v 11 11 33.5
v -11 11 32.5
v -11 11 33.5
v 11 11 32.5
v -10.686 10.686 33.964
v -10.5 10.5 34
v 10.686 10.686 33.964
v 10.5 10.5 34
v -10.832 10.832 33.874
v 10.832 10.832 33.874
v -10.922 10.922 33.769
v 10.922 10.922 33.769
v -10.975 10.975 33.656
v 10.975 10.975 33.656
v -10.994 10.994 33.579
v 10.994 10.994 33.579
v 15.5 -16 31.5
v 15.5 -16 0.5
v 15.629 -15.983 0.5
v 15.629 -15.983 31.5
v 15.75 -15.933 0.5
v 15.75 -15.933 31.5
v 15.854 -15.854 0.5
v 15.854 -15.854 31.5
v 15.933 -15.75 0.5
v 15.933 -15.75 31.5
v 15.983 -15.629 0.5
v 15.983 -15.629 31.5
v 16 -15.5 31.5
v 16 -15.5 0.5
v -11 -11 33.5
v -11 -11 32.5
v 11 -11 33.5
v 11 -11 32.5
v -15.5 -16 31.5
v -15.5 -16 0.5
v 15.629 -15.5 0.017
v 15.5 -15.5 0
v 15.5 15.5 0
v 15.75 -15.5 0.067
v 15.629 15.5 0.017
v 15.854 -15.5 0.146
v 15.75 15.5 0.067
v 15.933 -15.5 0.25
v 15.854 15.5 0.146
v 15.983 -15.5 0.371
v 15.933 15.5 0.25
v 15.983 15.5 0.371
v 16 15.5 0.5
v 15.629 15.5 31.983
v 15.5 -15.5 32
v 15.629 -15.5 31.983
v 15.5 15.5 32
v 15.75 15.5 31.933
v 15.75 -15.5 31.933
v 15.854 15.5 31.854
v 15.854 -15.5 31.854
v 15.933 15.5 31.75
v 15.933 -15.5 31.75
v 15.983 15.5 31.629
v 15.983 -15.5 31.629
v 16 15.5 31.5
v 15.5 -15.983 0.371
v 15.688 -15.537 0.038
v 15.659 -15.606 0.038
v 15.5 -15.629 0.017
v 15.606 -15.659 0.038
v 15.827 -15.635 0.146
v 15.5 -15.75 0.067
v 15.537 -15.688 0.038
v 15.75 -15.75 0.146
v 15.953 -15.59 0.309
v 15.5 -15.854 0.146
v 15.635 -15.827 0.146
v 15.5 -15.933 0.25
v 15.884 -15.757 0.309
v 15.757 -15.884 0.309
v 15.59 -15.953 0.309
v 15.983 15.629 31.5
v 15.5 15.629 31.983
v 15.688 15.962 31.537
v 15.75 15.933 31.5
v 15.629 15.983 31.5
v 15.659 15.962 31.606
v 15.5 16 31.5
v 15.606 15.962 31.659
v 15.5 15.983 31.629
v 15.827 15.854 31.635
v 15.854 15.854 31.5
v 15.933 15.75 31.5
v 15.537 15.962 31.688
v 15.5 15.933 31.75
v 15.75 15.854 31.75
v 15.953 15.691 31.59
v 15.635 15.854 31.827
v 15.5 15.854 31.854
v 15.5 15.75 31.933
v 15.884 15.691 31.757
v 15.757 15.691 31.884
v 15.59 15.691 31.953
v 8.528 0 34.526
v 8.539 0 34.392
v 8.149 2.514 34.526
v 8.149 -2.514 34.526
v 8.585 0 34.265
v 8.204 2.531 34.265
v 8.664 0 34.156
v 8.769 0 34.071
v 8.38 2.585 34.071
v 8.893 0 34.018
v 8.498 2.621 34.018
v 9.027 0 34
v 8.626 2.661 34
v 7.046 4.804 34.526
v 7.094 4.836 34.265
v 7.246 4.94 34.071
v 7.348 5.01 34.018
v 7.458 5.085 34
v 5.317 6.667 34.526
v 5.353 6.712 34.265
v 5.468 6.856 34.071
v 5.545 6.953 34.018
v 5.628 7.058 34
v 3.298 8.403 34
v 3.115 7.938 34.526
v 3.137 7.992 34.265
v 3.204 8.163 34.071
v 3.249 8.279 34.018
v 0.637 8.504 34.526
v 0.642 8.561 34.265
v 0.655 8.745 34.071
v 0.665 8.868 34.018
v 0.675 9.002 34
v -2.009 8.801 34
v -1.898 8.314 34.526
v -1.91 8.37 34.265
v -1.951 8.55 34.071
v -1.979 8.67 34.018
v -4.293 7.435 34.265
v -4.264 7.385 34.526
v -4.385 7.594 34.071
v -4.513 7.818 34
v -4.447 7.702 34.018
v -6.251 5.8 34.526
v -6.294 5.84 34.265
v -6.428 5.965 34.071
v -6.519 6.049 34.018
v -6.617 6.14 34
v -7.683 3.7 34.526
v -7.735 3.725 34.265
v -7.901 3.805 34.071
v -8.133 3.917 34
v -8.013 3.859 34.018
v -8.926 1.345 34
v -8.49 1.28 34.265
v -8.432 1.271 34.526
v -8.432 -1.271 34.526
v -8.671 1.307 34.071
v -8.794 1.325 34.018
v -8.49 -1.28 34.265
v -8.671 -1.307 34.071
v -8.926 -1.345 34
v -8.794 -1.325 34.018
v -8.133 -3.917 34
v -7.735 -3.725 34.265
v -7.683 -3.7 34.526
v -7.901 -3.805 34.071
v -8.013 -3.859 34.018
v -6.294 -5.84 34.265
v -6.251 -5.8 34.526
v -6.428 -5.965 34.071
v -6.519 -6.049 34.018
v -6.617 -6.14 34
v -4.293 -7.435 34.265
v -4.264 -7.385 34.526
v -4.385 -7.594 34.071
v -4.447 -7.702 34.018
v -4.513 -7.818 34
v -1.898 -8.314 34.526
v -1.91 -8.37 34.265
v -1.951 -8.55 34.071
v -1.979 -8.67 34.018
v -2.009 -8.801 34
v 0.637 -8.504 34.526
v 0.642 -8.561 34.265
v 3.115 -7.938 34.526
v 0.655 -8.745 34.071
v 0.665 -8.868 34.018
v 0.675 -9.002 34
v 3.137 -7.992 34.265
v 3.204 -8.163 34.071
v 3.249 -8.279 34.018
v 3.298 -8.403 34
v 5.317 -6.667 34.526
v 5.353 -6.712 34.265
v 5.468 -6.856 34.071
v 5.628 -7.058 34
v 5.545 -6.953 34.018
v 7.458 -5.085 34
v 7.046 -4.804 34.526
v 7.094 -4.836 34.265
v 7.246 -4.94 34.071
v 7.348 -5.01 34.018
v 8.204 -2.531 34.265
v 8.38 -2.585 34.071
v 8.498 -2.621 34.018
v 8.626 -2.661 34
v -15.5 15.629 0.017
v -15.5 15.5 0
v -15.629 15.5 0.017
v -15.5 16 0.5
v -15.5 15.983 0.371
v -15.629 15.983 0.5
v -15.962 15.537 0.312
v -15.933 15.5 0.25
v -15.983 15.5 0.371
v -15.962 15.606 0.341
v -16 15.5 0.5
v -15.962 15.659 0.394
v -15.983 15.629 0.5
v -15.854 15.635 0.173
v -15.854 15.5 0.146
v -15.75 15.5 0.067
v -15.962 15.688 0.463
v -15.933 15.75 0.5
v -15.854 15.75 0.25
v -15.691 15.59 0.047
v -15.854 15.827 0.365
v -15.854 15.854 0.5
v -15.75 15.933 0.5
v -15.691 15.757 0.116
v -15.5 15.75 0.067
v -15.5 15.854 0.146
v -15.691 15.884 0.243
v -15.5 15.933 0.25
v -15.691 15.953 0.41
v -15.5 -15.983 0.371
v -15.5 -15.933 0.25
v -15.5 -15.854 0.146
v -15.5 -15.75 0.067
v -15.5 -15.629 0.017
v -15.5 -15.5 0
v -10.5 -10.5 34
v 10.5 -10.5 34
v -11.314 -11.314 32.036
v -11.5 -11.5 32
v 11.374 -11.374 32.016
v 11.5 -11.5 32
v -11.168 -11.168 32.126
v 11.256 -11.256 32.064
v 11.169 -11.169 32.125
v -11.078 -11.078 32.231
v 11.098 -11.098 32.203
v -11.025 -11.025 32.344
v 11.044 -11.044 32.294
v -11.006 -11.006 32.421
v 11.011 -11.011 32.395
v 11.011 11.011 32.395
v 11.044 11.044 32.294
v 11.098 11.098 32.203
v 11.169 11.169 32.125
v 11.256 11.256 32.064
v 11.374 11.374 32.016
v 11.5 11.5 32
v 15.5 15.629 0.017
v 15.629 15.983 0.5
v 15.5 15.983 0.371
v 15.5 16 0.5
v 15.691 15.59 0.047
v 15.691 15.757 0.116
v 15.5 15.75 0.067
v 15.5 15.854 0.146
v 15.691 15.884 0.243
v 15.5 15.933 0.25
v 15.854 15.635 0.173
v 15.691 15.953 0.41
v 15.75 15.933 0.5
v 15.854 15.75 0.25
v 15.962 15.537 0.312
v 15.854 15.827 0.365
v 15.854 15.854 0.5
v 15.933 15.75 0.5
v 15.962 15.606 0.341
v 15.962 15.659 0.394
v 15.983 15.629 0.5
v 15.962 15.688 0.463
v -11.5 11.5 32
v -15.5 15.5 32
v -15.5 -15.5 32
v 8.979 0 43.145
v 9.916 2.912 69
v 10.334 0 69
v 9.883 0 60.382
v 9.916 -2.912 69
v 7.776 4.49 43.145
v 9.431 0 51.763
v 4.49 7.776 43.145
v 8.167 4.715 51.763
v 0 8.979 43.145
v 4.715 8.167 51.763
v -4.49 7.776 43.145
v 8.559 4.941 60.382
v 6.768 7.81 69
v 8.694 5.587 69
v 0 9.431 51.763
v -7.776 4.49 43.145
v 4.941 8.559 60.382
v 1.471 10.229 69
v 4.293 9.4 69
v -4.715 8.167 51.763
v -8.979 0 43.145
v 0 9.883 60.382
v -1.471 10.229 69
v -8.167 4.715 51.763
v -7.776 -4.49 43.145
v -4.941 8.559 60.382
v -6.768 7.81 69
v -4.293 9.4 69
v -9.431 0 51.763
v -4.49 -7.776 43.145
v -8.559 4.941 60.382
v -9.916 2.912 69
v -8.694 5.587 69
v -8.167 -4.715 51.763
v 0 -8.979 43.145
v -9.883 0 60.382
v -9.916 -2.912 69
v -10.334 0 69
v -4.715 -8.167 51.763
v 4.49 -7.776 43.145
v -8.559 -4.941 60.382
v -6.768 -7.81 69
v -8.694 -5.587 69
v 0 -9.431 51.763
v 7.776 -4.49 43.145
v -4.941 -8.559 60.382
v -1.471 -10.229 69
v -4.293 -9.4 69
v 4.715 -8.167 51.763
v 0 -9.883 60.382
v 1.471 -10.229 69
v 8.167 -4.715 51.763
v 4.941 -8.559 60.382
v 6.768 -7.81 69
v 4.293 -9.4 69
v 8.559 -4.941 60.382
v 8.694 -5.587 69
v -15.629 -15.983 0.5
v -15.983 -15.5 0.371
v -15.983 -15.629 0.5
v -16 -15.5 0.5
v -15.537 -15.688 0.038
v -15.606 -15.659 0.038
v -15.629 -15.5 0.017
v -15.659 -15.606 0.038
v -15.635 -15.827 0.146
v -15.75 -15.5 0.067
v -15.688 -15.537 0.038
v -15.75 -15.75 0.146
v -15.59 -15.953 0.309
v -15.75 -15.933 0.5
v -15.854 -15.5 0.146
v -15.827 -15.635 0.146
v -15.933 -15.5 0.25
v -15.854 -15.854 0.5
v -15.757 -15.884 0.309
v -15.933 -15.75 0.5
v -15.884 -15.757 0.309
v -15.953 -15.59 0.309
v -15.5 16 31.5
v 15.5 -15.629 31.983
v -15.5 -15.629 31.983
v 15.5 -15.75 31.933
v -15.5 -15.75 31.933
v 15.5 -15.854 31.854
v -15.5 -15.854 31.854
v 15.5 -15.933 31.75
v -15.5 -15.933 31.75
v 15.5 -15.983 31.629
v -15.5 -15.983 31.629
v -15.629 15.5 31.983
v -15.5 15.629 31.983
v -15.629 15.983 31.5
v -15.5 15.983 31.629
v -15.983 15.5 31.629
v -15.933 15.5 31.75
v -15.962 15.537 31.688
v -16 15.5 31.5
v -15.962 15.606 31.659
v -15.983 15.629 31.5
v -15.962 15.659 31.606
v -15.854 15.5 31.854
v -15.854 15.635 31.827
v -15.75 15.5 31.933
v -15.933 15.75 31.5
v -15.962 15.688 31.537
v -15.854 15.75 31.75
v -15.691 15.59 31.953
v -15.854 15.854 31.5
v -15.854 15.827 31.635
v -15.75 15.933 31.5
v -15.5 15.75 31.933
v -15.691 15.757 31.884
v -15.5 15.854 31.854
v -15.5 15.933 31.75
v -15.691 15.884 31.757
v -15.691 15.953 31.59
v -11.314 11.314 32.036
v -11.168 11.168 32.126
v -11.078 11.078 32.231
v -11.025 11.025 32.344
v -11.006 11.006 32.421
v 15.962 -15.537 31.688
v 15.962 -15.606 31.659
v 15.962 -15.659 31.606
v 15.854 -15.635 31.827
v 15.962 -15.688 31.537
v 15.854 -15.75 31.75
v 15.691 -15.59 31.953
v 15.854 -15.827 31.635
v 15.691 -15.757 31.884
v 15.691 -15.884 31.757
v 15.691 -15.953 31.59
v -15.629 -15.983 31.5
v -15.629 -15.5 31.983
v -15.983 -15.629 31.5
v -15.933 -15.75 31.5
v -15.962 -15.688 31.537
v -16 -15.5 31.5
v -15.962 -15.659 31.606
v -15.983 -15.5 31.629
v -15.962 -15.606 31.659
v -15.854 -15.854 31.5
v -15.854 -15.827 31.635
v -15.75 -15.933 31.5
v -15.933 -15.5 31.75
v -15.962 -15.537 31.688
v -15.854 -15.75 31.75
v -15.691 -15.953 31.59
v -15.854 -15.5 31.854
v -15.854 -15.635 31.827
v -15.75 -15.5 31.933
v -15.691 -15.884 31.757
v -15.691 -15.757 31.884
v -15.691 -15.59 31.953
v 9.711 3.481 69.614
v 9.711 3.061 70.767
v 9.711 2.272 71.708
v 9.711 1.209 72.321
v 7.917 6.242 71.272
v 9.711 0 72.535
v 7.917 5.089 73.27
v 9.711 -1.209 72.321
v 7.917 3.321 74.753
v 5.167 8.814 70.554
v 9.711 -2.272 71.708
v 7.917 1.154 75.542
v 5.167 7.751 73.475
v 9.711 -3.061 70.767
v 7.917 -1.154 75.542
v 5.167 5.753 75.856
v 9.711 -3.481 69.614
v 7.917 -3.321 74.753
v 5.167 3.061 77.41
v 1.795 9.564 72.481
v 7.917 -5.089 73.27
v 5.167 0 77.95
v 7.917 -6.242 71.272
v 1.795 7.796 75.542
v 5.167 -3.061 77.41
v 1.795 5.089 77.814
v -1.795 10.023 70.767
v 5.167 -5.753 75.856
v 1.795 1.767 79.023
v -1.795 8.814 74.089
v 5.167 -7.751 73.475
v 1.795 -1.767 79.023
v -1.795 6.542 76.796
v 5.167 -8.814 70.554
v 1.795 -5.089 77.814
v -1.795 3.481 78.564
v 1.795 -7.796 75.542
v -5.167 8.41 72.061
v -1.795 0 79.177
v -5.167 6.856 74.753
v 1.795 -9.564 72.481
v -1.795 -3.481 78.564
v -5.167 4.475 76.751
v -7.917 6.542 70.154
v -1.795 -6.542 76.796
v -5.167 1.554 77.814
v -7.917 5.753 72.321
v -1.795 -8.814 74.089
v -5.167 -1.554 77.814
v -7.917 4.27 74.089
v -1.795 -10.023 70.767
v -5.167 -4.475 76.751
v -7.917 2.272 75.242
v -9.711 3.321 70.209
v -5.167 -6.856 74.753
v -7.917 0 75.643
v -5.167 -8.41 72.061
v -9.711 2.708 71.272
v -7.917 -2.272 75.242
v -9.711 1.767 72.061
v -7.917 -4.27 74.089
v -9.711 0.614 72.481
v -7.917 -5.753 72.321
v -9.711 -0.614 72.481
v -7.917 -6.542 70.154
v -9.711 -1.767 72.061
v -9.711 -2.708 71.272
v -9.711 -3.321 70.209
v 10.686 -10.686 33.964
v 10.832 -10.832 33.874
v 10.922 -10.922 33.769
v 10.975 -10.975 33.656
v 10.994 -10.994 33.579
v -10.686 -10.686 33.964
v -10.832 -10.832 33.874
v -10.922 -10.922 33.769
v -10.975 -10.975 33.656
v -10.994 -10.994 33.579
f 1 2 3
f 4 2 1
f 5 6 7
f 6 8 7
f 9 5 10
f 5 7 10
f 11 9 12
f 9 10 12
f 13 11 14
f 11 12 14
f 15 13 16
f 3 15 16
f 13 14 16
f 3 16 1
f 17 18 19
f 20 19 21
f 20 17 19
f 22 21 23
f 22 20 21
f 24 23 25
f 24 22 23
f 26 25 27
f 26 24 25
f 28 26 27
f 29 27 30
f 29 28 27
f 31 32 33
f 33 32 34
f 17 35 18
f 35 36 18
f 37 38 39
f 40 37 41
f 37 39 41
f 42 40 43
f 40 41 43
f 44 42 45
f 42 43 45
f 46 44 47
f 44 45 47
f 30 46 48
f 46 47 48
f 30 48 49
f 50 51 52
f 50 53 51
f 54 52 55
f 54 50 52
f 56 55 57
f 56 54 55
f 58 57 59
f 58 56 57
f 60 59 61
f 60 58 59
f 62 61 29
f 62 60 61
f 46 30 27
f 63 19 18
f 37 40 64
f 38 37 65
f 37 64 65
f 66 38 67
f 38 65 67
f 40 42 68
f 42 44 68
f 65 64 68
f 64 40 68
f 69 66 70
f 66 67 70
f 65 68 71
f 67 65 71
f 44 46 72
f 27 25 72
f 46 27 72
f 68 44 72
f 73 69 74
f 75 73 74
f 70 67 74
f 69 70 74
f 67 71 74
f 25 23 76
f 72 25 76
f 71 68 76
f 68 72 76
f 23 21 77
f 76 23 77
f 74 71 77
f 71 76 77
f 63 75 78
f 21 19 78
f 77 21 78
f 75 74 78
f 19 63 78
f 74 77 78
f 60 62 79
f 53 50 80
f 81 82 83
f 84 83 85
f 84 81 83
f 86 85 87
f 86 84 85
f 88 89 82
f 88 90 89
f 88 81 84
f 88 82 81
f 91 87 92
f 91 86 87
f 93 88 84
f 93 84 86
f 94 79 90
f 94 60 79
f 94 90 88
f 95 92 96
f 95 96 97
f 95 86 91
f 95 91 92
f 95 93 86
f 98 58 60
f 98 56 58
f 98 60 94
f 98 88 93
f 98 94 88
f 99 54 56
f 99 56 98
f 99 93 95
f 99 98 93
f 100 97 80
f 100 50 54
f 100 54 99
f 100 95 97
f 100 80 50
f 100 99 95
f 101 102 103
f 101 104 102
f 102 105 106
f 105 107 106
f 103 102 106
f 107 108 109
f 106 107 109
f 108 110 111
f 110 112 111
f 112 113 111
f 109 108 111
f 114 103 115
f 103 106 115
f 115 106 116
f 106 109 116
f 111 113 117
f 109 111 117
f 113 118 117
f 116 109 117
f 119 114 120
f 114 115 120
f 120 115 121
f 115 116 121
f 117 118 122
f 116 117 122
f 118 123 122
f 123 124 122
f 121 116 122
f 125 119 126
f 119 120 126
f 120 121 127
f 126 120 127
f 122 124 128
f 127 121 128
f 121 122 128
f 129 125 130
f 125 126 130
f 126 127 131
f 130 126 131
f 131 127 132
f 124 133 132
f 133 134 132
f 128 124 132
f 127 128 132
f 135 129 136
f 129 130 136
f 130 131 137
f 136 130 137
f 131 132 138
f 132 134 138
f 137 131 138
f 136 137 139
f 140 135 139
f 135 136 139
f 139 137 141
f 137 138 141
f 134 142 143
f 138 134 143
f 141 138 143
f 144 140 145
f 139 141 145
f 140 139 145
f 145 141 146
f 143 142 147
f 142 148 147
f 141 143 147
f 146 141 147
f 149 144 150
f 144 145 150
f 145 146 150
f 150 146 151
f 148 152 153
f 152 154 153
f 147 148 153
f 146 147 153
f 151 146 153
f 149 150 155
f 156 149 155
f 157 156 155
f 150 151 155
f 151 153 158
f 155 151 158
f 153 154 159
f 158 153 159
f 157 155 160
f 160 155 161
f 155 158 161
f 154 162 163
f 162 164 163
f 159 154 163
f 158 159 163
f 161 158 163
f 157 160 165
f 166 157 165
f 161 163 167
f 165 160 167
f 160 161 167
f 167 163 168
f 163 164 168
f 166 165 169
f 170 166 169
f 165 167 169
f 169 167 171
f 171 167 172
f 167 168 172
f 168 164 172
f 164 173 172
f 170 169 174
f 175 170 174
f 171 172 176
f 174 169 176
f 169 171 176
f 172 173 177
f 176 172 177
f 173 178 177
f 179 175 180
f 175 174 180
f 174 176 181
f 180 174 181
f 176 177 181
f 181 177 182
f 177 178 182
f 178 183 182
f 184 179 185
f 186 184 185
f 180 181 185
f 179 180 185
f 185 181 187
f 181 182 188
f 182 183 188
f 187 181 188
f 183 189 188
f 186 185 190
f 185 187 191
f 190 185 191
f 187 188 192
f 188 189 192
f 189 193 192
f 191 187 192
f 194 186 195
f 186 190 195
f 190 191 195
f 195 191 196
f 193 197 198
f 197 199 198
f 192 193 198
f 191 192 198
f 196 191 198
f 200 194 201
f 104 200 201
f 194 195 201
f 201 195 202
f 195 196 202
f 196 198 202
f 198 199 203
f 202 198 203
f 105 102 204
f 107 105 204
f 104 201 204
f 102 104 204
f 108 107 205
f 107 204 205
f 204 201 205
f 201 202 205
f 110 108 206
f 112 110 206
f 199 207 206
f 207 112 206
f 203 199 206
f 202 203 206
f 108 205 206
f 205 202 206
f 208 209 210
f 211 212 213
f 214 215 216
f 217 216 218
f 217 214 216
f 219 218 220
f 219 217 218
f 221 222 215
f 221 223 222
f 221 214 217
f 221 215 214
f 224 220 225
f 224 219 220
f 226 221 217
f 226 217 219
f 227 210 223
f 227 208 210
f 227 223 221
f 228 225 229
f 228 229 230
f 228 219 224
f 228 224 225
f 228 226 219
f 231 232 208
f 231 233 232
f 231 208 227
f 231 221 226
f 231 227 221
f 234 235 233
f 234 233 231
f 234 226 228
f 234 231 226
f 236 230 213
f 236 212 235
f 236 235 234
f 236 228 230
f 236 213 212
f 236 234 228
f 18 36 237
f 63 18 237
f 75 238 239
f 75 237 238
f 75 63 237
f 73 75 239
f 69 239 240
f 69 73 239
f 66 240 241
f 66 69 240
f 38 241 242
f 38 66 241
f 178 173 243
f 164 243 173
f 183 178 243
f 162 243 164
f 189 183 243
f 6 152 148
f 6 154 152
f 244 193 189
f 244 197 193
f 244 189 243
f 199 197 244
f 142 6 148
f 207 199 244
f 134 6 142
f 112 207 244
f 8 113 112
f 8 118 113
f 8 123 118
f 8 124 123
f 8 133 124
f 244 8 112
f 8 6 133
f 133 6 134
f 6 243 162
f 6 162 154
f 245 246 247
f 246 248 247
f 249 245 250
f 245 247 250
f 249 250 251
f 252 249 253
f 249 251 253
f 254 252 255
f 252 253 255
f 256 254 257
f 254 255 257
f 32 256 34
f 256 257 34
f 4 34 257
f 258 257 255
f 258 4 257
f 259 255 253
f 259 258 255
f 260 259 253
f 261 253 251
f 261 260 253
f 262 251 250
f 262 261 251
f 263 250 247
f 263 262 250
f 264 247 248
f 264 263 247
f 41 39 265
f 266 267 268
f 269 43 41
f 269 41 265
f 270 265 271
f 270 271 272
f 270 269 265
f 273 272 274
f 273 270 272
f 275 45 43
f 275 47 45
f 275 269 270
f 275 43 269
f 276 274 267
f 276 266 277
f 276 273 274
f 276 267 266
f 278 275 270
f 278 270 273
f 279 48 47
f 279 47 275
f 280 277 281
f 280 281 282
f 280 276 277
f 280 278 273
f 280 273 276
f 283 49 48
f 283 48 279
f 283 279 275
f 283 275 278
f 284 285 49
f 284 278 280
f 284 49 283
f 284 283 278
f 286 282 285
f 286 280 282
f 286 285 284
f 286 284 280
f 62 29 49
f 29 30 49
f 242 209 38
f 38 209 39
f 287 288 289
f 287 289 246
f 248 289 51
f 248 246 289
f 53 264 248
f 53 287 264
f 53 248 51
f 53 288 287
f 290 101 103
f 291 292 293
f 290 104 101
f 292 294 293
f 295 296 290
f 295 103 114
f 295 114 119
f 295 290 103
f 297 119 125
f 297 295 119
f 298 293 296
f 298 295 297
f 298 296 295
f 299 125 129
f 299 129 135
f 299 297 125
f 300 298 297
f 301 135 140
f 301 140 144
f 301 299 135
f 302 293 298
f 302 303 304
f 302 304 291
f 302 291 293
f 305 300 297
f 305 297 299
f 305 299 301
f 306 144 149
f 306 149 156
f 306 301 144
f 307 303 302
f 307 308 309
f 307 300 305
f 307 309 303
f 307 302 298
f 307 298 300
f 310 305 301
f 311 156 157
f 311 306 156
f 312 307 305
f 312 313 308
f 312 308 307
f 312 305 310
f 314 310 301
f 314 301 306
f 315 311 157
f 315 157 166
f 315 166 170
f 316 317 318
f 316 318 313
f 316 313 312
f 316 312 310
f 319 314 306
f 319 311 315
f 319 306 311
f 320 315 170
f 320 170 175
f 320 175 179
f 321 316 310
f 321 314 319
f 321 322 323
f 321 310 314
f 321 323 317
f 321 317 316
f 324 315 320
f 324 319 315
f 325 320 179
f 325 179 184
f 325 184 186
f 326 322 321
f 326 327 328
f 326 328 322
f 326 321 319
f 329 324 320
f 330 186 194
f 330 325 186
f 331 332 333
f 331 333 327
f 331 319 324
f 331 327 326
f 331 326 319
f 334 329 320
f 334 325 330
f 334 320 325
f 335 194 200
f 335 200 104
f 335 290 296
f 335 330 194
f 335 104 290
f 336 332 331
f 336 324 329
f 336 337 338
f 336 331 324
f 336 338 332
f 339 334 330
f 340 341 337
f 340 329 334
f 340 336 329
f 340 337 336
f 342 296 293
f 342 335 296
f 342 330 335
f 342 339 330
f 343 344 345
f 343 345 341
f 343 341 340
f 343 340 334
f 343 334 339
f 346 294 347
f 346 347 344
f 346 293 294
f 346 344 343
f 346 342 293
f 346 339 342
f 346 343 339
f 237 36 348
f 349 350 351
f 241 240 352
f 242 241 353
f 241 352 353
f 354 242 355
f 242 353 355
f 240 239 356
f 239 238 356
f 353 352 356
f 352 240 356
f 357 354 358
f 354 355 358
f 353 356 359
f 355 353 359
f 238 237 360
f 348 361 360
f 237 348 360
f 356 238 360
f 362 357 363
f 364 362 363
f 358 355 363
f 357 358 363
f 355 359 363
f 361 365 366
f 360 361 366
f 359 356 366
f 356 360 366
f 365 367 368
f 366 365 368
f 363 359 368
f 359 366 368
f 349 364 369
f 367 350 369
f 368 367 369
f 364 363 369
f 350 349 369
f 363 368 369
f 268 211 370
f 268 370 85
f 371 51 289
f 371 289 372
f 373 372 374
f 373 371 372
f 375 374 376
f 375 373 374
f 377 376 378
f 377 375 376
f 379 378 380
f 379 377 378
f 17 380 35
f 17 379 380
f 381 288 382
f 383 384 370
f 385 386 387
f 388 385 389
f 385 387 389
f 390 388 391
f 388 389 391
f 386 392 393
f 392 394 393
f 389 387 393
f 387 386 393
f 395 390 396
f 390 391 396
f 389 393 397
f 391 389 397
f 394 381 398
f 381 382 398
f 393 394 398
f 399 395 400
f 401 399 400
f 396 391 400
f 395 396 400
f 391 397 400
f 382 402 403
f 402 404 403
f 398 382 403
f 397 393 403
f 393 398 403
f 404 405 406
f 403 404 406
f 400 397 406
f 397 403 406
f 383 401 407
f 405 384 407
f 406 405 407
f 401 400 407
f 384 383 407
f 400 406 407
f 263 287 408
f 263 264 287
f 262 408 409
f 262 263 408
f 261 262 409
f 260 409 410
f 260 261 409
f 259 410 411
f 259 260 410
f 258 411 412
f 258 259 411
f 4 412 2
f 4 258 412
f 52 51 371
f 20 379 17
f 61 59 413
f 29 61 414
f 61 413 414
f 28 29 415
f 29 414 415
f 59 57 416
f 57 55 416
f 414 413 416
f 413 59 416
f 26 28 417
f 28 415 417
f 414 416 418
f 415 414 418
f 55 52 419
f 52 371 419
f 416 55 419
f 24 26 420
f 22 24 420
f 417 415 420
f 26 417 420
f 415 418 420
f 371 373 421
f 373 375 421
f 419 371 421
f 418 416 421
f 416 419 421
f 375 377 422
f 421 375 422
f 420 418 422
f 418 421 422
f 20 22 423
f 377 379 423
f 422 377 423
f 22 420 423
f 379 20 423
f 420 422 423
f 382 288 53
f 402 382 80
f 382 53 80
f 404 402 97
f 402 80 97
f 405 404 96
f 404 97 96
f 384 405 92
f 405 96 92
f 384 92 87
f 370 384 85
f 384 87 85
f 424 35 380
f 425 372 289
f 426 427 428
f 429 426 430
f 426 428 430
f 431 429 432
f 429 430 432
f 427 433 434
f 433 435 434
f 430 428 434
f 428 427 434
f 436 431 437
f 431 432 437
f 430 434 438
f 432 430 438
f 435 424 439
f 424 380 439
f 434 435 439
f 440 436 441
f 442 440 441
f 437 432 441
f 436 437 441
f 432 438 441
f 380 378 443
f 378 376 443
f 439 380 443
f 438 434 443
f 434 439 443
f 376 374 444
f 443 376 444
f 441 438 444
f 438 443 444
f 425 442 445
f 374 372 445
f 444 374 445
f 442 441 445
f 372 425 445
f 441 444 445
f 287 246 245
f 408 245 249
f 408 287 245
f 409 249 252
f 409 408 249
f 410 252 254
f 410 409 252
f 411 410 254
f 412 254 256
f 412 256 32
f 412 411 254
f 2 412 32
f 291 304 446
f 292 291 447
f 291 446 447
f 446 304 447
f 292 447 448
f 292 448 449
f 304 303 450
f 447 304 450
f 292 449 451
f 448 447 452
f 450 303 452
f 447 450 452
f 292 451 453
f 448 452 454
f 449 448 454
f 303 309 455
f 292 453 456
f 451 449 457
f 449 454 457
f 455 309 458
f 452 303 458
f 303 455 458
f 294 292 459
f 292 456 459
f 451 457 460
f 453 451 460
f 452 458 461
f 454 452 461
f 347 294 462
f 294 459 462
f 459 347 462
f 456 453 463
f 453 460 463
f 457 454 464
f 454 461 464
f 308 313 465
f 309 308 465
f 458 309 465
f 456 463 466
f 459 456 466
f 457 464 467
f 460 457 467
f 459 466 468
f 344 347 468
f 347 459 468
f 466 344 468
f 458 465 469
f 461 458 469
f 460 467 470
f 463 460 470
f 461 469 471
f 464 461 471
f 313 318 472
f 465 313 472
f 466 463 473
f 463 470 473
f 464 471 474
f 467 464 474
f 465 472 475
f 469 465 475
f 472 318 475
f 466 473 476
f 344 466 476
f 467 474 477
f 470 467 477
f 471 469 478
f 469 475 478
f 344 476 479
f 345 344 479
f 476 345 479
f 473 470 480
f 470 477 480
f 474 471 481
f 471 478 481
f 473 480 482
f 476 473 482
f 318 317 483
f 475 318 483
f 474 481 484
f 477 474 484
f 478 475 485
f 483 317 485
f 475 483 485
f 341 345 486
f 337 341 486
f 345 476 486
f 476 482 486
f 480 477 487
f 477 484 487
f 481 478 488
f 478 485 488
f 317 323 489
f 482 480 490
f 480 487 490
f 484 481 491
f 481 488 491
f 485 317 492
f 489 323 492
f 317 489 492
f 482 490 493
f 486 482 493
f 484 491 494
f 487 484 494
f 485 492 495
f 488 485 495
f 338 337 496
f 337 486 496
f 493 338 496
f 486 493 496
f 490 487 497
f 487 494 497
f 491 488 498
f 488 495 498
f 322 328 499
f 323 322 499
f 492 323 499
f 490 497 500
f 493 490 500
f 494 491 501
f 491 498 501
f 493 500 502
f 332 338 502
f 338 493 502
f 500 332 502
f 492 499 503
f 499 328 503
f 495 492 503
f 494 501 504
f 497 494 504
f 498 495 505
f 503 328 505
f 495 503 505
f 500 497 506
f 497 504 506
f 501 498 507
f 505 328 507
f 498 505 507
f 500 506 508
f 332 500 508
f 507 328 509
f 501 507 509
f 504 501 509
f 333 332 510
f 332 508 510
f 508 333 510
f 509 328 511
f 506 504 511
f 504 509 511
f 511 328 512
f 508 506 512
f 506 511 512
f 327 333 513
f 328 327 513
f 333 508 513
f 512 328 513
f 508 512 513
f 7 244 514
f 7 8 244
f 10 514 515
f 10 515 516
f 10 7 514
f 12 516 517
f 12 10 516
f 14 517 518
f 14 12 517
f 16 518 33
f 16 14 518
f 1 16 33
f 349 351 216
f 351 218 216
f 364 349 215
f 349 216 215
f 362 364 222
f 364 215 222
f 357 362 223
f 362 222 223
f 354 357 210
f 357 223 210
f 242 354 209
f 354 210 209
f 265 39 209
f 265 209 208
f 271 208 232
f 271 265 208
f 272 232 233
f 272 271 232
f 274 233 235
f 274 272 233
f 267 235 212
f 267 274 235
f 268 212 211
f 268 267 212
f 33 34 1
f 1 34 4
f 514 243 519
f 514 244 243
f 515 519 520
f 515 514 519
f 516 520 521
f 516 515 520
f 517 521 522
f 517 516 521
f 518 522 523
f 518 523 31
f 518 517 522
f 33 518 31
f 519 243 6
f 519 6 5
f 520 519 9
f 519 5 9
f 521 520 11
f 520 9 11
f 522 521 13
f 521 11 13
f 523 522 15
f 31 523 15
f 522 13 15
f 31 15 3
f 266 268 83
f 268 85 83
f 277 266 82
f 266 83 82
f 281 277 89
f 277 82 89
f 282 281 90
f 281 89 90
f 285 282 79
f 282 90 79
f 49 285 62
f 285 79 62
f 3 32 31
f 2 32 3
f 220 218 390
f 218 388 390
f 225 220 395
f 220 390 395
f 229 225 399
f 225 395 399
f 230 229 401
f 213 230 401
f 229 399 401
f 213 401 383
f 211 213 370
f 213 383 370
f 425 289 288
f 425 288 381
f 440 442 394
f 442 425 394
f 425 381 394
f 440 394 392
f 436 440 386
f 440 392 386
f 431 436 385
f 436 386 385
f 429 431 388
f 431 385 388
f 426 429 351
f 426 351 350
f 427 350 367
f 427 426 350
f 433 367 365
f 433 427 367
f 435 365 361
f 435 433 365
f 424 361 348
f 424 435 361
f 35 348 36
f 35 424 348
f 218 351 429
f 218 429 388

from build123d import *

# Parameters (mm, degrees)
F0_W     = 32
F0_H     = 32
F1_DEPTH = 32
F2_W     = 22
F2_H     = 22
F3_DEPTH = 2
F4_R     = 8.5
F5_DEPTH = 35
F5_TAPER = -3
F8_R     = 0.5
F9_R     = 0.5


with BuildPart() as f1:
    # F0 (on Top) → F1 (new body)
    with BuildSketch(Plane.XY):
        Rectangle(F0_W, F0_H)
    extrude(amount=F1_DEPTH)

    # F2 (on face) → F3 (join)
    with BuildSketch(Plane.XY.offset(32)):
        Rectangle(F2_W, F2_H)
    extrude(amount=F3_DEPTH)

    # F4 (on face) → F5 (join)
    with BuildSketch(Plane.XY.offset(34)):
        Circle(F4_R)
    extrude(amount=F5_DEPTH, taper=F5_TAPER)

    # F6 (on face) → F7 (revolve)
    with BuildSketch(Plane.XY.offset(69)):
        with BuildLine():
            ThreePointArc((10.3342722749, 0), (0, 10.3342722749), (-10.3342722749, 0))
            Line((-10.3342722749, 0), (0, 0))
            Line((0, 0), (10.3342722749, 0))
        make_face()
    revolve(axis=Axis((-5.1671361375, 0, 69), (1, 0, 0)))

    # F8
    f8_edges = [f1.edges().sort_by_distance(p)[0] for p in [
        (0, -11, 34),
        (11, 0, 34),
        (11, 0, 32),
        (0, -11, 32),
        (0, 16, 0),
        (0, 11, 32),
        (0, 11, 34),
        (-11, 0, 32),
        (-11, 0, 34),
        (-8.5, 0, 34),
    ]]
    fillet(f8_edges, radius=F8_R)

    # F9
    f9_edges = [f1.edges().sort_by_distance(p)[0] for p in [
        (0, -16, 32),
        (16, 0, 32),
        (16, -16, 16),
        (16, 16, 16.25),
        (-16, -16, 16),
        (0, -16, 0),
        (16, -0.25, 0),
        (0, 16, 32),
        (-16, 0, 32),
        (-16, -0.25, 0),
    ]]
    fillet(f9_edges, radius=F9_R)


solid = f1.part
